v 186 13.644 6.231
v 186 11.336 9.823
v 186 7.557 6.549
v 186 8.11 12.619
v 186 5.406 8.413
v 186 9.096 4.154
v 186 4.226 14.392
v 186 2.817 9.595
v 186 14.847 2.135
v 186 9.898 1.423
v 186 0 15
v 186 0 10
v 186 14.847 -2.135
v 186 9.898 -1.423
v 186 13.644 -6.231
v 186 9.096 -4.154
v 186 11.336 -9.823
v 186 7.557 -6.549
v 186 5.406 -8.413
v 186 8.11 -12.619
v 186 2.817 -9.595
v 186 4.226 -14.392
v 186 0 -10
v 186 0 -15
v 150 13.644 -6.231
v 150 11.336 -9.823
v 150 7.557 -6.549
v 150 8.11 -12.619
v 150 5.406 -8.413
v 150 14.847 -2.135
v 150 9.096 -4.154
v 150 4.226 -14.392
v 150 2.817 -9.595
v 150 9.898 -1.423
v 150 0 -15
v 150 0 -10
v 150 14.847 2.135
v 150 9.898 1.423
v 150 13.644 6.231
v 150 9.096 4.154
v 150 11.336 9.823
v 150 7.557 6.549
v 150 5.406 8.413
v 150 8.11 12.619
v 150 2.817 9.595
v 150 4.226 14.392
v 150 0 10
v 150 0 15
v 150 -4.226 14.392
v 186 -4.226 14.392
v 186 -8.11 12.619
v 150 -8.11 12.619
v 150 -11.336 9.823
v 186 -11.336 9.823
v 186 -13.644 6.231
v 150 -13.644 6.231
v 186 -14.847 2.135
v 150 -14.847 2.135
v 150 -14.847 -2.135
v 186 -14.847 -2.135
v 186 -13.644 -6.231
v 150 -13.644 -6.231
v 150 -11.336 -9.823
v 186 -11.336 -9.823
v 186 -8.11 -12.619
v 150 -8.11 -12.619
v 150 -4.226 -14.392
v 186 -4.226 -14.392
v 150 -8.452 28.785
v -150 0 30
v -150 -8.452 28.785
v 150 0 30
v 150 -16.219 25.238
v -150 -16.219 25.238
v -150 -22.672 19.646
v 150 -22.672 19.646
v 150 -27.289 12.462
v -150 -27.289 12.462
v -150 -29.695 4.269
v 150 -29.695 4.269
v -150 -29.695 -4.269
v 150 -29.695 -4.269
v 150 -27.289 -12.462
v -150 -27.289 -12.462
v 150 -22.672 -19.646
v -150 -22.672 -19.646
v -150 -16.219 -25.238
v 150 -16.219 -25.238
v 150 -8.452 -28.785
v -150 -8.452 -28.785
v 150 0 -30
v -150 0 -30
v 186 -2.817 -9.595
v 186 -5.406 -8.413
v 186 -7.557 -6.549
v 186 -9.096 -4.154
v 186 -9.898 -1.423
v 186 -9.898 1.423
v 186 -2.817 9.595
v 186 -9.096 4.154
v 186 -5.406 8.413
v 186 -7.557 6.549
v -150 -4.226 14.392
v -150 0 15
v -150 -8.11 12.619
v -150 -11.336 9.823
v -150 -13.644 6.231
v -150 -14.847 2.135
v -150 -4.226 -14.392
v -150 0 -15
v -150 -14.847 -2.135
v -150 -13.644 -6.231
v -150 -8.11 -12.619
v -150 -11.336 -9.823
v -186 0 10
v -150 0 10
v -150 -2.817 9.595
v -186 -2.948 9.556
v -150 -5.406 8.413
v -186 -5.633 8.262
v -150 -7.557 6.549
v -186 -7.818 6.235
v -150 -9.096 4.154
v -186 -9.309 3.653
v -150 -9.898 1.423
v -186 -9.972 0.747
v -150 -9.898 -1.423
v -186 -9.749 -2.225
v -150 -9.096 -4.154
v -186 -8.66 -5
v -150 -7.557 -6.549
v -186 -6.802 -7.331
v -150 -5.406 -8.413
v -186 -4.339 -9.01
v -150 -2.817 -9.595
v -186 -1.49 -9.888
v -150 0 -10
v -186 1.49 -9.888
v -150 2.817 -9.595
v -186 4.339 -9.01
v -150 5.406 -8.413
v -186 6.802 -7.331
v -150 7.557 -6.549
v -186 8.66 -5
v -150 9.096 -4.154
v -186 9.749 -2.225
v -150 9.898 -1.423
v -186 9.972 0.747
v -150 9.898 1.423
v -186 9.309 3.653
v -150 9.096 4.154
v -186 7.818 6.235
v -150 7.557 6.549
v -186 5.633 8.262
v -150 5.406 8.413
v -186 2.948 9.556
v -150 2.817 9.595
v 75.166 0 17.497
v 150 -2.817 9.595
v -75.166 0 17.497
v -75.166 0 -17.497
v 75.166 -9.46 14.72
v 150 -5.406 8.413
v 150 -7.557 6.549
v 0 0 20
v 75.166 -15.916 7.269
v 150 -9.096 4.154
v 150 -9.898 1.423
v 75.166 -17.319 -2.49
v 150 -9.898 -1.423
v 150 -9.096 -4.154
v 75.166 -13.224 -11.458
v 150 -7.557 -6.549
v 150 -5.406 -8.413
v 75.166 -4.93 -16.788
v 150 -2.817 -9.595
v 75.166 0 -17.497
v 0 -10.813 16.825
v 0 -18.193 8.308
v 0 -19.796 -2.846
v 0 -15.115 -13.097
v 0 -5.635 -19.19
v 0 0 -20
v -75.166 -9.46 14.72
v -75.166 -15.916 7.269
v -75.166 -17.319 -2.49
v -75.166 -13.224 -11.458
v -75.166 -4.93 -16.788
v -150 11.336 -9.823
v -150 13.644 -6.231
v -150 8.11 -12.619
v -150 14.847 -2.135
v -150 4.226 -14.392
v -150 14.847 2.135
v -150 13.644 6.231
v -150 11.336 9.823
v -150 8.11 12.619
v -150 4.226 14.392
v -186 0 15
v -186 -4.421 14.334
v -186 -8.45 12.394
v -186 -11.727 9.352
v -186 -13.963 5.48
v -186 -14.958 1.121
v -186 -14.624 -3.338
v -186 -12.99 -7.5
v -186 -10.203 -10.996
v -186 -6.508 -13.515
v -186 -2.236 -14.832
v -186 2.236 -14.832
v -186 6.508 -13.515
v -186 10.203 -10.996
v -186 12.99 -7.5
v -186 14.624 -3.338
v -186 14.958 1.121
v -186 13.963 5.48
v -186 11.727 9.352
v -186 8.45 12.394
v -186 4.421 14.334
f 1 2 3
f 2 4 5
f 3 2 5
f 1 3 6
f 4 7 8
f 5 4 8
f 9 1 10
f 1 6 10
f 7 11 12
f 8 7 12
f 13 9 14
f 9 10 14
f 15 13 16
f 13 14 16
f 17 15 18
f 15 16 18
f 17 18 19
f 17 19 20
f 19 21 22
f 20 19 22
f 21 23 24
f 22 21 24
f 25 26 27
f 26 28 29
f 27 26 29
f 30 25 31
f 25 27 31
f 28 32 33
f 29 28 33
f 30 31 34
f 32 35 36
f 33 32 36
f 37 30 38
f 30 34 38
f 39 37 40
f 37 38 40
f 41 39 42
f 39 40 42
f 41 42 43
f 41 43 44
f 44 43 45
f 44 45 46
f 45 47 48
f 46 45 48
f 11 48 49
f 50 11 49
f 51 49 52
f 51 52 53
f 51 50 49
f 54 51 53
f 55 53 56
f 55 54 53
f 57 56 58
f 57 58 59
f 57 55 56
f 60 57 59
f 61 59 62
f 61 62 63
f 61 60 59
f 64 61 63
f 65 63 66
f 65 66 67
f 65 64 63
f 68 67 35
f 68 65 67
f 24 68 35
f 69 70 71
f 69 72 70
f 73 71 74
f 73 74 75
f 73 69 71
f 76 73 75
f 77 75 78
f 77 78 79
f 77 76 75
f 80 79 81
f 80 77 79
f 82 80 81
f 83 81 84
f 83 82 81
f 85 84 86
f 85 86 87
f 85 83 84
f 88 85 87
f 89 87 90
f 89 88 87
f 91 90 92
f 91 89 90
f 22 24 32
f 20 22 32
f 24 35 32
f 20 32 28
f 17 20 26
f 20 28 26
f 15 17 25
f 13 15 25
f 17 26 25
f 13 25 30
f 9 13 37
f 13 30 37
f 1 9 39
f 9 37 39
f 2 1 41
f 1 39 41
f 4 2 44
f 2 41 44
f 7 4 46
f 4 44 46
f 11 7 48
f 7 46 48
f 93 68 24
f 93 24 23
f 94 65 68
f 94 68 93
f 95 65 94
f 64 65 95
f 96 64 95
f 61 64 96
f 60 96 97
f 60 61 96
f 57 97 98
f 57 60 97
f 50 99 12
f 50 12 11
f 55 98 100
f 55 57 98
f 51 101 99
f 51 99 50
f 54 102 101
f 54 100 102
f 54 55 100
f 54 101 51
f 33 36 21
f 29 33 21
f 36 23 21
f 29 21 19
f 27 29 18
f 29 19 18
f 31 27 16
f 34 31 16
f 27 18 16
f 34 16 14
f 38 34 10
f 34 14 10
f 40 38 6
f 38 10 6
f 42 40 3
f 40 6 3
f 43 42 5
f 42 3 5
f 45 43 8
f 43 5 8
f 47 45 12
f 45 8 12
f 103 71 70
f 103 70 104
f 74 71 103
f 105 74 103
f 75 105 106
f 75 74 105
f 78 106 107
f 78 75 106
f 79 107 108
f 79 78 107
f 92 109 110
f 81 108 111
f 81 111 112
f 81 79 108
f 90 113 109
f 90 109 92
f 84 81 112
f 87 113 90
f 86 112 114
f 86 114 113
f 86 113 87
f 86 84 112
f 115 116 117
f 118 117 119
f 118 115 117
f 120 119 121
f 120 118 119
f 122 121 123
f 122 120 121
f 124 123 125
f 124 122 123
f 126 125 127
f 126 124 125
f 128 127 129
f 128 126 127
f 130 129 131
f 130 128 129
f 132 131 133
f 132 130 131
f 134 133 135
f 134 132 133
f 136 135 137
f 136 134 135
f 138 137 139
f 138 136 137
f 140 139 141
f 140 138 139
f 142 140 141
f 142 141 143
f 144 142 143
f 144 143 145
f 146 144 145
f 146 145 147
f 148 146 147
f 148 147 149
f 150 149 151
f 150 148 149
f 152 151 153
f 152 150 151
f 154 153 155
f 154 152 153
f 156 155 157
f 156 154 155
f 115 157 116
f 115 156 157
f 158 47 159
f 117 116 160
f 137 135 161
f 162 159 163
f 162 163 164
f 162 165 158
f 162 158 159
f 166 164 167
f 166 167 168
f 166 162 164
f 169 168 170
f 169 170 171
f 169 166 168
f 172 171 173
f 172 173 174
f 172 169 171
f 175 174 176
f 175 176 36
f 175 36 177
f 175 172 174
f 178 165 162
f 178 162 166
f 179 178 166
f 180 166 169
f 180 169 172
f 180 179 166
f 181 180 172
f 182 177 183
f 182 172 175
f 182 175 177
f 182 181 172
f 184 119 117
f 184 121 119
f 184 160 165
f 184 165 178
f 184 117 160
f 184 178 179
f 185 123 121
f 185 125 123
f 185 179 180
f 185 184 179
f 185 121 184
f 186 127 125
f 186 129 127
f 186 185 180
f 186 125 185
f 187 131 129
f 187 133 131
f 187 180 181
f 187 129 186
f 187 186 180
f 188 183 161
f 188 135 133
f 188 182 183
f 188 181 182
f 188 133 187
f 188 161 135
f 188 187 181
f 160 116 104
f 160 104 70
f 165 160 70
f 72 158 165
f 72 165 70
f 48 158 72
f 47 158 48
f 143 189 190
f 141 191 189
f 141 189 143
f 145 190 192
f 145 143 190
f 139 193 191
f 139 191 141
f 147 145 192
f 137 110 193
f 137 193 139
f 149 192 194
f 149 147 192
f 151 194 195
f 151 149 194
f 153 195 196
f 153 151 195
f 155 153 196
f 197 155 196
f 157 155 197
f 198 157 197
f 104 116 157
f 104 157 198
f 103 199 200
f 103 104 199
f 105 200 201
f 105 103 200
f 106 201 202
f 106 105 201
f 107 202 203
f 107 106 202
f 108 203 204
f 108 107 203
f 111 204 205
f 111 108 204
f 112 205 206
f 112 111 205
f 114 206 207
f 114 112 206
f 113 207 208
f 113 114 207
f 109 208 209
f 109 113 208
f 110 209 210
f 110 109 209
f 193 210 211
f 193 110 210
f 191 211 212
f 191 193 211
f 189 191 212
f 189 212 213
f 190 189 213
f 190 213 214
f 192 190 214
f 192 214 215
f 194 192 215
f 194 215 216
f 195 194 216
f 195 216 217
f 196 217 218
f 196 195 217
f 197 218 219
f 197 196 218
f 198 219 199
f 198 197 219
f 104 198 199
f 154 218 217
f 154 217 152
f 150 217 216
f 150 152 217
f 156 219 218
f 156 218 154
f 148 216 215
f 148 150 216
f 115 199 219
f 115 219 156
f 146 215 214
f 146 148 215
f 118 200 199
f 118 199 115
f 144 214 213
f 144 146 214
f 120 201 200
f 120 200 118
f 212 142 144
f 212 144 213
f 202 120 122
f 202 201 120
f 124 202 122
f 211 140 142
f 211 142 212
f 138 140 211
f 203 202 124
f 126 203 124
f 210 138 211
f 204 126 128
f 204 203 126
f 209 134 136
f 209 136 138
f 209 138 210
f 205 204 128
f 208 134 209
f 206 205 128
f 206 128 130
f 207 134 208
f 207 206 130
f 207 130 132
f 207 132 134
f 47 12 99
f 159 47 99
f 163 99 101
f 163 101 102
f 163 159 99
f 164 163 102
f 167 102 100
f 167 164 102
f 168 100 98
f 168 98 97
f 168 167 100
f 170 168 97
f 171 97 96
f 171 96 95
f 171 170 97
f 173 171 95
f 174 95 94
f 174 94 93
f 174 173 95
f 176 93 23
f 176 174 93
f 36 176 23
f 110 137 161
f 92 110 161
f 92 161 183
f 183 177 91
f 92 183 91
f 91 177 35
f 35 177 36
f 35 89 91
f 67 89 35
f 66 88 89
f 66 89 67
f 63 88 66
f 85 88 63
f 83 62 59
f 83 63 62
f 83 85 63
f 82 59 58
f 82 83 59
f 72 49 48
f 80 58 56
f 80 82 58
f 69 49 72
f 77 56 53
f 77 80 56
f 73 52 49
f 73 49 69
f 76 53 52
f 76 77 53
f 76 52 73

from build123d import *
from build123d.topology import SkipClean

# Parameters (mm, degrees)
REVOLVE2_ANGLE = 180.0000000000004


with BuildPart() as part:
    # Sketch2 → Revolve2 (revolve)
    with BuildSketch(Plane(origin=(0, 0, 0), x_dir=(1, 0, 0), z_dir=(0, 1, 0))):
        with BuildLine():
            Line((-186, -15.000000000000009), (-150, -15))
            Line((-150, -15), (-150, -30.000000000000004))
            Line((-150, -30.000000000000004), (150, -29.999999999999947))
            Line((150, -29.999999999999947), (150, -15))
            Line((150, -15), (186, -15.000000000000009))
            Line((186, -15.000000000000009), (186, -10.000000000000014))
            Line((186, -10.000000000000014), (150, -10.000000000000005))
            ThreePointArc((150, -10.000000000000005), (-1.3897e-13, -20), (-150, -10.000000000000005))
            Line((-150, -10.000000000000005), (-186, -10.000000000000014))
            Line((-186, -10.000000000000014), (-186, -15.000000000000009))
        make_face()
    revolve(axis=Axis((-186, 0, 0), (1, 0, 0)), revolution_arc=REVOLVE2_ANGLE)

    # Sketch3 → Revolve3 (revolve)
    with BuildSketch(Plane.XY, mode=Mode.PRIVATE) as revolve3_sk:
        Polygon((-186, 9.999999999999988), (-186, 14.99999999999999), (-150, 14.999999999999988), (-150, 9.999999999999993), align=None)
    revolve3 = revolve(revolve3_sk.sketch.rotate(Axis((-186, 0, 0), (1, 0, 0)), 90), axis=Axis((-186, 0, 0), (1, 0, 0)))

    # Mirror1: Revolve3 across plane
    with SkipClean():  # the faces are left unmerged after this step: merging them gives an invalid solid
        add(revolve3.mirror(Plane(origin=(0, 0, 0), x_dir=(0, 0, 1), z_dir=(1, 0, 0))))


solid = part.part
